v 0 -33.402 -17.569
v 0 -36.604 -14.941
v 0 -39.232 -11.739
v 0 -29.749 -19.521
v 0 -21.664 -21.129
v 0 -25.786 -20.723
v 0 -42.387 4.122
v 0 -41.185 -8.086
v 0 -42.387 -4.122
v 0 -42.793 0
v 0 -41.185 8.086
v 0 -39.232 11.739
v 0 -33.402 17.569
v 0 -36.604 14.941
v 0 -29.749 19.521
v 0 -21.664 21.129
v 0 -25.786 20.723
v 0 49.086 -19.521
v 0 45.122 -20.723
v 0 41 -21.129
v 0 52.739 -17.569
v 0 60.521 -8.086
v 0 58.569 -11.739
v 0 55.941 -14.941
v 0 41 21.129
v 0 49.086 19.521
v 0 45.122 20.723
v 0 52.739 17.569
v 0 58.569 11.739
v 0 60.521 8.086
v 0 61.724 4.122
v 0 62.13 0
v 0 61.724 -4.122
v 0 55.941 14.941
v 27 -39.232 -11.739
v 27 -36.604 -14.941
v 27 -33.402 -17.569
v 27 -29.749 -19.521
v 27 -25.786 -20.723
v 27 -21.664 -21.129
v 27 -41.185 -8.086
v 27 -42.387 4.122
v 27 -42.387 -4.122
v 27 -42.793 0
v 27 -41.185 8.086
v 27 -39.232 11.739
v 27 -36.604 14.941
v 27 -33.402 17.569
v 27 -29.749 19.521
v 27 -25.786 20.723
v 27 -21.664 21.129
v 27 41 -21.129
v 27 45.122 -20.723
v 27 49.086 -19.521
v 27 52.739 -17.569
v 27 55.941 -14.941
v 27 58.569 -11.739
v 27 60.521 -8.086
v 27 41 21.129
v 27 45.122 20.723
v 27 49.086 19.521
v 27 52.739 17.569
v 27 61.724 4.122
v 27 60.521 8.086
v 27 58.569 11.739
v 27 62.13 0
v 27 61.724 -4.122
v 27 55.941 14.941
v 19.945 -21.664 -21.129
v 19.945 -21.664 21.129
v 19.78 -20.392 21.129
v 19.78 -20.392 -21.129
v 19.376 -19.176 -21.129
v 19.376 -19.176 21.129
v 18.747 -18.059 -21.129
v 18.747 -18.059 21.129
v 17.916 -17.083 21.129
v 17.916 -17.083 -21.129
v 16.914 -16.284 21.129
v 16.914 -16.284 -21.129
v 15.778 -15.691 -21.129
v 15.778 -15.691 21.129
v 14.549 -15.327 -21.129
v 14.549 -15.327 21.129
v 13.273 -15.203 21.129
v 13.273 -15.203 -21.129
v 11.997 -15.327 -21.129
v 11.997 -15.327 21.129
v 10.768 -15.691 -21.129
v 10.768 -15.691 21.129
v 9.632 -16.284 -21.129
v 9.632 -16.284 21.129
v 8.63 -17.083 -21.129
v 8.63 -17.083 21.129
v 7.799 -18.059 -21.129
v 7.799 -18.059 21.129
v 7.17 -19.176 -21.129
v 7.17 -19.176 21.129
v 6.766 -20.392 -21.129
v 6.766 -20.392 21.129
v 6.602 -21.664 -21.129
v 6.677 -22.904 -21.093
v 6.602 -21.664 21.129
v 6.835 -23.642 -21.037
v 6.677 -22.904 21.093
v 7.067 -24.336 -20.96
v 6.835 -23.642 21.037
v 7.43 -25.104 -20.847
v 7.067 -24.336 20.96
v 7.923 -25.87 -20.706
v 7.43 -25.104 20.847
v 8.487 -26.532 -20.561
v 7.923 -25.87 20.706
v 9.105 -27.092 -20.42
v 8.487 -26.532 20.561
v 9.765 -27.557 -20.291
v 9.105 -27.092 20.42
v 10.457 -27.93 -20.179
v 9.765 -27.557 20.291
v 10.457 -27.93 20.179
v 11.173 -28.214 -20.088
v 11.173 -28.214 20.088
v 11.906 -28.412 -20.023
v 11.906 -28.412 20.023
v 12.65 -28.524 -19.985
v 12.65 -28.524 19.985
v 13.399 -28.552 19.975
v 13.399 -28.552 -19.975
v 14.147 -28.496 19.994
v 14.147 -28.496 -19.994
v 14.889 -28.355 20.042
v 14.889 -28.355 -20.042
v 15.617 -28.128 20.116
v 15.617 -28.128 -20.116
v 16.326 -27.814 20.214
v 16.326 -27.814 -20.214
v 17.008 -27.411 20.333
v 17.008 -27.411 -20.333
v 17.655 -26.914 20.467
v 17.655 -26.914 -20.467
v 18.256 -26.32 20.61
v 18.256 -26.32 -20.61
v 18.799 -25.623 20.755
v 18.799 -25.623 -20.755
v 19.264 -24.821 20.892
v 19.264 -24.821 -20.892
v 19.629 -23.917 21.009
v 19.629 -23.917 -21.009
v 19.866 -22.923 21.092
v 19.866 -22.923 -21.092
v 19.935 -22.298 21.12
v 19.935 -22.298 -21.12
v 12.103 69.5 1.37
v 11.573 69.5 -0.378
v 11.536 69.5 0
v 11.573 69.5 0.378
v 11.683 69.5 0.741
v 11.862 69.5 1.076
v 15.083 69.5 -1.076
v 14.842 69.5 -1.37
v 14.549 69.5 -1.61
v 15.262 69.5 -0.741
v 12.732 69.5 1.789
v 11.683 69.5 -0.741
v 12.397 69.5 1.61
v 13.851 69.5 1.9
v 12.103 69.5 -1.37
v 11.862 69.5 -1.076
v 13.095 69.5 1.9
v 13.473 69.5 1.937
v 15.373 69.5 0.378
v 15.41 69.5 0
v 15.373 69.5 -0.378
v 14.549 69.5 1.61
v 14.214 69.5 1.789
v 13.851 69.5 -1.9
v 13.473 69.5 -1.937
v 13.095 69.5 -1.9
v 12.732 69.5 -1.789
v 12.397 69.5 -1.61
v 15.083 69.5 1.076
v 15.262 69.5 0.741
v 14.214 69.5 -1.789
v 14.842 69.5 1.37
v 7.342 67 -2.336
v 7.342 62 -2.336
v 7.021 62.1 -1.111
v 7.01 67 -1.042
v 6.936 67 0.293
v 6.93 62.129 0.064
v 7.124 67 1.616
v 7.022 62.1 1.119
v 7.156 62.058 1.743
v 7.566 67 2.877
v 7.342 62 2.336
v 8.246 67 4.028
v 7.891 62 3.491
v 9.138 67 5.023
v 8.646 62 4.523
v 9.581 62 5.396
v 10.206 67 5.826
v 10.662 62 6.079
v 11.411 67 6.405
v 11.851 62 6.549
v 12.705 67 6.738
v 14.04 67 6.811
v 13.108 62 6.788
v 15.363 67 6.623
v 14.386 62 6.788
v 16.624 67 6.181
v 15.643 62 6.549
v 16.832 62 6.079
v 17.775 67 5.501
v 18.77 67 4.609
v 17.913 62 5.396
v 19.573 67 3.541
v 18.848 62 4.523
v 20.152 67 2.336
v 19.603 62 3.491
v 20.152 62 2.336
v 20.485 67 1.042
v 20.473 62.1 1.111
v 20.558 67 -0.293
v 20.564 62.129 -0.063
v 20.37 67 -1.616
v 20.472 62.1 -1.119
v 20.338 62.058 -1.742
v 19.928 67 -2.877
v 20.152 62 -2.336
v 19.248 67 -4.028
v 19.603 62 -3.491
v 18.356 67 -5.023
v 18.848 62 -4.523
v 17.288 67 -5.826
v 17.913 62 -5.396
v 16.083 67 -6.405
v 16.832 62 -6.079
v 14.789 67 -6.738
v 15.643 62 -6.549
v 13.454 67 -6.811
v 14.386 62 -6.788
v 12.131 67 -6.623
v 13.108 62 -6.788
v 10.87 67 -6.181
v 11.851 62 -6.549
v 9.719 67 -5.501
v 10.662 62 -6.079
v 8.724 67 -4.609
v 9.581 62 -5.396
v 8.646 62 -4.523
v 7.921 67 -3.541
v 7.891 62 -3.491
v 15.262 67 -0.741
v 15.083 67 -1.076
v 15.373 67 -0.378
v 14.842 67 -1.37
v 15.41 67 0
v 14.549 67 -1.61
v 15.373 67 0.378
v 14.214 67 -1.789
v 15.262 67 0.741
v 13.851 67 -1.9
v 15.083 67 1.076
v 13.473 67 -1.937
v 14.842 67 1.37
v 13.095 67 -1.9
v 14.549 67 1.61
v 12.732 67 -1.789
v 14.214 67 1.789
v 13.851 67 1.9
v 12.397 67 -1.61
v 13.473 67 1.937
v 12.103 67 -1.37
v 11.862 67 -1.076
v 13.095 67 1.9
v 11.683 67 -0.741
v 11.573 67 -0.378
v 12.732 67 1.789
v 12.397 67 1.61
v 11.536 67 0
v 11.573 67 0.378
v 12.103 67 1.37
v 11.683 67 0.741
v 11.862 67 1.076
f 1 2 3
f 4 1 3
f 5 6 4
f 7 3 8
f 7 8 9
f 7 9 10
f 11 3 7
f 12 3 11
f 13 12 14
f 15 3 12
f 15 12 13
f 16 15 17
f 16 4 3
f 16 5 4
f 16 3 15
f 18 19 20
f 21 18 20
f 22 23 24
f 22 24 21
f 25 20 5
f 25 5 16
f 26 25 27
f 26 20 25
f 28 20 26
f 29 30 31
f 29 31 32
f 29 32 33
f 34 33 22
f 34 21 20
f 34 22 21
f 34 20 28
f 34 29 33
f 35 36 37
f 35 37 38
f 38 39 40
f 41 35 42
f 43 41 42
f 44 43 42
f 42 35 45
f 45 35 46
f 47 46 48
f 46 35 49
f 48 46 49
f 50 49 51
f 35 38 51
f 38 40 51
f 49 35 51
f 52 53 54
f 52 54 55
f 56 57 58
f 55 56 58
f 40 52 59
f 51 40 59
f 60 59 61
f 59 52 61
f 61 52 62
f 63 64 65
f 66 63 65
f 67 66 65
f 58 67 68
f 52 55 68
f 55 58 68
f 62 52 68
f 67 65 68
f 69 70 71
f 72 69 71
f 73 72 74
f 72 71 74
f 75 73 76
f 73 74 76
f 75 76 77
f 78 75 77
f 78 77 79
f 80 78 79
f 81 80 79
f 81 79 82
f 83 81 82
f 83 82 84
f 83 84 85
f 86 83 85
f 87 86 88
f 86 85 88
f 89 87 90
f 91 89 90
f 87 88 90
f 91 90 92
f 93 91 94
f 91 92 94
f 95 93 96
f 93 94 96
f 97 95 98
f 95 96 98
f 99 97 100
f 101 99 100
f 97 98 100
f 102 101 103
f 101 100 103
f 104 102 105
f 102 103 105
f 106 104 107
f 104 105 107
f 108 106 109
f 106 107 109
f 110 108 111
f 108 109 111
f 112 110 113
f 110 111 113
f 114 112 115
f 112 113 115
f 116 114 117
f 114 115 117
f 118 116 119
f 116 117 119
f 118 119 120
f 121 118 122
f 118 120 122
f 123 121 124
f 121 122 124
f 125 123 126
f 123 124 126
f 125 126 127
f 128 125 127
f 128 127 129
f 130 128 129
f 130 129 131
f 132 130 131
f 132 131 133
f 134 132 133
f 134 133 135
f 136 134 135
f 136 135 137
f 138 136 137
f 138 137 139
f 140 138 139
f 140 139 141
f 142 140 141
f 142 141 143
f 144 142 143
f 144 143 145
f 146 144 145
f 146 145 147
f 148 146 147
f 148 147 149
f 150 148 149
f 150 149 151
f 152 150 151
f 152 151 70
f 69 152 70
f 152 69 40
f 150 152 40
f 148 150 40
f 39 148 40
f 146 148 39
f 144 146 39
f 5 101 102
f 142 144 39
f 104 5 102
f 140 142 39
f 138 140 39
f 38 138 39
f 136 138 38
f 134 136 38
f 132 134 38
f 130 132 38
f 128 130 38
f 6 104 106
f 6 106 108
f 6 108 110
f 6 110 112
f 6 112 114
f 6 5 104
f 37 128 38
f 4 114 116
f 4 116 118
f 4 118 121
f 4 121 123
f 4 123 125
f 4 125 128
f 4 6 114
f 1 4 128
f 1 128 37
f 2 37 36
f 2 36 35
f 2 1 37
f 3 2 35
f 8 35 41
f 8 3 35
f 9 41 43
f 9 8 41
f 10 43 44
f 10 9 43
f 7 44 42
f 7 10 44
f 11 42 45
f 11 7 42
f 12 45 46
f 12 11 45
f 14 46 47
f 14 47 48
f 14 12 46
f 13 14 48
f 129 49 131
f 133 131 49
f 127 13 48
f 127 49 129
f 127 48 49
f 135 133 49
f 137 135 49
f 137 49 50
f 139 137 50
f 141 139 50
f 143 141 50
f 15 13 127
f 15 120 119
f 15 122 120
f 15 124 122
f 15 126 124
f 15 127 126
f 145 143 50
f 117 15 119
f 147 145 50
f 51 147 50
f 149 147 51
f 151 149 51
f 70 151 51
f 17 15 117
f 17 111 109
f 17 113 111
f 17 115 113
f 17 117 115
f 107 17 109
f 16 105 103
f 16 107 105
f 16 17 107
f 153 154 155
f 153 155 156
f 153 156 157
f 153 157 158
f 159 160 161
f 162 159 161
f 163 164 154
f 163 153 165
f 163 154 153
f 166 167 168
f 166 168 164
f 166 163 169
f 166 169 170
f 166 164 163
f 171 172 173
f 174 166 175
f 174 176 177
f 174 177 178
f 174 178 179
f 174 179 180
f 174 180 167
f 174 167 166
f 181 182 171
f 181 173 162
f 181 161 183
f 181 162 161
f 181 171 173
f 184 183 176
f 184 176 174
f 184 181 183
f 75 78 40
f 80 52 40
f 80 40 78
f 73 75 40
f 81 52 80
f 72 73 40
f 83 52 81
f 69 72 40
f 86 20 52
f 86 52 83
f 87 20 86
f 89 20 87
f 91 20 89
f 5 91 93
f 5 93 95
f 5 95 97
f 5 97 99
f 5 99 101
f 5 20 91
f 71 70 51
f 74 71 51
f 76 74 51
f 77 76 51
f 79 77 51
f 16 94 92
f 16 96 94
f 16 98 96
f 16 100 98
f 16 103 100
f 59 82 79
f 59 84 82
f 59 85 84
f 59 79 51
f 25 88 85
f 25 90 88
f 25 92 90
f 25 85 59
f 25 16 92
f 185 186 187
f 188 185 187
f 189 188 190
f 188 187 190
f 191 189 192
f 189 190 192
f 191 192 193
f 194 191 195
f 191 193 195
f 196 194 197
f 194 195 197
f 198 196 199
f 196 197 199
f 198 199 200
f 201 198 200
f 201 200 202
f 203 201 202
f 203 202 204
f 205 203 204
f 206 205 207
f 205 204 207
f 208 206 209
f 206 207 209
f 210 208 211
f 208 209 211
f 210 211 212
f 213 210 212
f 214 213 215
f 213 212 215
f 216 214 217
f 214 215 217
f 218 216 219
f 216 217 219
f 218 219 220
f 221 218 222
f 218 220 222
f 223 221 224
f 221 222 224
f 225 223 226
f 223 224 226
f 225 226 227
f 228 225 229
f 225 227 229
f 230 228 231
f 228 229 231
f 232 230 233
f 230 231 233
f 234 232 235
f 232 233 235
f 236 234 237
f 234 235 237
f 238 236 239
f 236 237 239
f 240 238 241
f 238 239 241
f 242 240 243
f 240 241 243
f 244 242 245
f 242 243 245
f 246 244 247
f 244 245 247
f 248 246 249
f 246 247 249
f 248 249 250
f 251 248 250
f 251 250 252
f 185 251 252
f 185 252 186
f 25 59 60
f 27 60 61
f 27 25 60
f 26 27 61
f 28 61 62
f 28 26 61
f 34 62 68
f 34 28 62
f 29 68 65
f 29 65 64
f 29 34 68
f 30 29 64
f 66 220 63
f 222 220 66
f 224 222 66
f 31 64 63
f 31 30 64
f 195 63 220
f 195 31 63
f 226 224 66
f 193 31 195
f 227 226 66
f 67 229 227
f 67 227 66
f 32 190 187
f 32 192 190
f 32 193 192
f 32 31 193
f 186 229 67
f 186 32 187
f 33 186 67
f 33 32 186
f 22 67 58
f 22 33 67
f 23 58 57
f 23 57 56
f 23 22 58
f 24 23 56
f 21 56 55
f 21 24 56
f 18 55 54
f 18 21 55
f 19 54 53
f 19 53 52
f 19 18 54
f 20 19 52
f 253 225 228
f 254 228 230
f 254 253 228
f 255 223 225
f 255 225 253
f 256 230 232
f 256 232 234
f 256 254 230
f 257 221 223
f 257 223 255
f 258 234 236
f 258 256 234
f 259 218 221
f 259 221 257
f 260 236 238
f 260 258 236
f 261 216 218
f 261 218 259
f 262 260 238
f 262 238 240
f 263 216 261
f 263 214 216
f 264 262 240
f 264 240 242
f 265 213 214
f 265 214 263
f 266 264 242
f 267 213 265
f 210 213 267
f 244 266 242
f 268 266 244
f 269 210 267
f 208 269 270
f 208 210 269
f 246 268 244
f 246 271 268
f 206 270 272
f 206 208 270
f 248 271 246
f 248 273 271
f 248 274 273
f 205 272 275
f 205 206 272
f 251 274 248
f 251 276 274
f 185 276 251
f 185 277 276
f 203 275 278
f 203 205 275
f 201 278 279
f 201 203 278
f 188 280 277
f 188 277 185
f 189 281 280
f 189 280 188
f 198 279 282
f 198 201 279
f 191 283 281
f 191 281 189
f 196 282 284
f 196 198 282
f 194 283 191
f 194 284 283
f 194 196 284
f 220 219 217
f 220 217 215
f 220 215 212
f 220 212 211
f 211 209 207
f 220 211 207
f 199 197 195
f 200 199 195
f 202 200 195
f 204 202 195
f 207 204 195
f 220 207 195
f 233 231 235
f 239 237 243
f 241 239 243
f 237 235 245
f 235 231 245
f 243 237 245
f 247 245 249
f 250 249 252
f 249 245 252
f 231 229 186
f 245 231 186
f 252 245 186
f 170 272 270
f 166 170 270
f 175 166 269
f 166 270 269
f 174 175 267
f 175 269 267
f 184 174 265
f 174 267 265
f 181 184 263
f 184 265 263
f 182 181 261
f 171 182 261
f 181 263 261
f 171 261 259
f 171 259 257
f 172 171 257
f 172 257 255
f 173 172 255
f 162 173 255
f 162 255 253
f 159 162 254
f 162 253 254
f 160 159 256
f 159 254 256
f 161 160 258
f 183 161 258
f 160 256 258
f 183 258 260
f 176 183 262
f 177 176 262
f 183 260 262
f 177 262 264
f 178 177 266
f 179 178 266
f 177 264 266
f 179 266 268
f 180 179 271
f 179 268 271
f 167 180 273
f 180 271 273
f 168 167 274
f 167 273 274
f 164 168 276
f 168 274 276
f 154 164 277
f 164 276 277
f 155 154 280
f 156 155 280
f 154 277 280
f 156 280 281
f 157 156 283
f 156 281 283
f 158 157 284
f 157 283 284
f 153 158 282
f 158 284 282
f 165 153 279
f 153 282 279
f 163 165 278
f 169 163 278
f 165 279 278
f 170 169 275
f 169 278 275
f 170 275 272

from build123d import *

# Parameters (mm, degrees)
BOSS_EXTRUDE2_DEPTH = 27
SKETCH6_R           = 6.674919097
CUT_EXTRUDE4_DEPTH  = 51
SKETCH7_R           = 6.817553131
BOSS_EXTRUDE3_DEPTH = 5
SKETCH8_R           = 1.936916623
BOSS_EXTRUDE4_DEPTH = 2.5


with BuildPart() as part:
    # Sketch3 → Boss-Extrude2 (new body)
    with BuildSketch(Plane(origin=(0, 0, 0), x_dir=(0, 0, -1), z_dir=(1, 0, 0))):
        with BuildLine():
            Line((-21.129473144, -21.663550217), (-21.129473144, 41.000059198))
            ThreePointArc((-21.129473144, 41.000059198), (0, 62.129532342), (21.129473144, 41.000059198))
            Line((21.129473144, 41.000059198), (21.129473144, -21.663550217))
            ThreePointArc((21.129473144, -21.663550217), (0, -42.793023362), (-21.129473144, -21.663550217))
        make_face()
    extrude(amount=BOSS_EXTRUDE2_DEPTH)

    # Sketch6 → Cut-Extrude4 (cut)
    with BuildSketch(Plane.XY.offset(22)):
        with Locations(Location((13.273045942, -21.878359575, 0), (0, 0, 1.844186398))):
            Circle(SKETCH6_R)
    extrude(amount=-CUT_EXTRUDE4_DEPTH, mode=Mode.SUBTRACT)

    # Sketch7 → Boss-Extrude3 (add)
    with BuildSketch(Plane(origin=(0, 62, 0), x_dir=(1, 0, 0), z_dir=(0, 1, 0))):
        with Locations(Location((13.747053519, 0, 0), (0, 0, 159.961468388))):
            Circle(SKETCH7_R)
    extrude(amount=BOSS_EXTRUDE3_DEPTH)

    # Sketch8 → Boss-Extrude4 (add)
    with BuildSketch(Plane(origin=(0, 67, 0), x_dir=(1, 0, 0), z_dir=(0, 1, 0))):
        with Locations(Location((13.472827278, 0, 0), (0, 0, 270))):
            Circle(SKETCH8_R)
    extrude(amount=BOSS_EXTRUDE4_DEPTH)


solid = part.part
